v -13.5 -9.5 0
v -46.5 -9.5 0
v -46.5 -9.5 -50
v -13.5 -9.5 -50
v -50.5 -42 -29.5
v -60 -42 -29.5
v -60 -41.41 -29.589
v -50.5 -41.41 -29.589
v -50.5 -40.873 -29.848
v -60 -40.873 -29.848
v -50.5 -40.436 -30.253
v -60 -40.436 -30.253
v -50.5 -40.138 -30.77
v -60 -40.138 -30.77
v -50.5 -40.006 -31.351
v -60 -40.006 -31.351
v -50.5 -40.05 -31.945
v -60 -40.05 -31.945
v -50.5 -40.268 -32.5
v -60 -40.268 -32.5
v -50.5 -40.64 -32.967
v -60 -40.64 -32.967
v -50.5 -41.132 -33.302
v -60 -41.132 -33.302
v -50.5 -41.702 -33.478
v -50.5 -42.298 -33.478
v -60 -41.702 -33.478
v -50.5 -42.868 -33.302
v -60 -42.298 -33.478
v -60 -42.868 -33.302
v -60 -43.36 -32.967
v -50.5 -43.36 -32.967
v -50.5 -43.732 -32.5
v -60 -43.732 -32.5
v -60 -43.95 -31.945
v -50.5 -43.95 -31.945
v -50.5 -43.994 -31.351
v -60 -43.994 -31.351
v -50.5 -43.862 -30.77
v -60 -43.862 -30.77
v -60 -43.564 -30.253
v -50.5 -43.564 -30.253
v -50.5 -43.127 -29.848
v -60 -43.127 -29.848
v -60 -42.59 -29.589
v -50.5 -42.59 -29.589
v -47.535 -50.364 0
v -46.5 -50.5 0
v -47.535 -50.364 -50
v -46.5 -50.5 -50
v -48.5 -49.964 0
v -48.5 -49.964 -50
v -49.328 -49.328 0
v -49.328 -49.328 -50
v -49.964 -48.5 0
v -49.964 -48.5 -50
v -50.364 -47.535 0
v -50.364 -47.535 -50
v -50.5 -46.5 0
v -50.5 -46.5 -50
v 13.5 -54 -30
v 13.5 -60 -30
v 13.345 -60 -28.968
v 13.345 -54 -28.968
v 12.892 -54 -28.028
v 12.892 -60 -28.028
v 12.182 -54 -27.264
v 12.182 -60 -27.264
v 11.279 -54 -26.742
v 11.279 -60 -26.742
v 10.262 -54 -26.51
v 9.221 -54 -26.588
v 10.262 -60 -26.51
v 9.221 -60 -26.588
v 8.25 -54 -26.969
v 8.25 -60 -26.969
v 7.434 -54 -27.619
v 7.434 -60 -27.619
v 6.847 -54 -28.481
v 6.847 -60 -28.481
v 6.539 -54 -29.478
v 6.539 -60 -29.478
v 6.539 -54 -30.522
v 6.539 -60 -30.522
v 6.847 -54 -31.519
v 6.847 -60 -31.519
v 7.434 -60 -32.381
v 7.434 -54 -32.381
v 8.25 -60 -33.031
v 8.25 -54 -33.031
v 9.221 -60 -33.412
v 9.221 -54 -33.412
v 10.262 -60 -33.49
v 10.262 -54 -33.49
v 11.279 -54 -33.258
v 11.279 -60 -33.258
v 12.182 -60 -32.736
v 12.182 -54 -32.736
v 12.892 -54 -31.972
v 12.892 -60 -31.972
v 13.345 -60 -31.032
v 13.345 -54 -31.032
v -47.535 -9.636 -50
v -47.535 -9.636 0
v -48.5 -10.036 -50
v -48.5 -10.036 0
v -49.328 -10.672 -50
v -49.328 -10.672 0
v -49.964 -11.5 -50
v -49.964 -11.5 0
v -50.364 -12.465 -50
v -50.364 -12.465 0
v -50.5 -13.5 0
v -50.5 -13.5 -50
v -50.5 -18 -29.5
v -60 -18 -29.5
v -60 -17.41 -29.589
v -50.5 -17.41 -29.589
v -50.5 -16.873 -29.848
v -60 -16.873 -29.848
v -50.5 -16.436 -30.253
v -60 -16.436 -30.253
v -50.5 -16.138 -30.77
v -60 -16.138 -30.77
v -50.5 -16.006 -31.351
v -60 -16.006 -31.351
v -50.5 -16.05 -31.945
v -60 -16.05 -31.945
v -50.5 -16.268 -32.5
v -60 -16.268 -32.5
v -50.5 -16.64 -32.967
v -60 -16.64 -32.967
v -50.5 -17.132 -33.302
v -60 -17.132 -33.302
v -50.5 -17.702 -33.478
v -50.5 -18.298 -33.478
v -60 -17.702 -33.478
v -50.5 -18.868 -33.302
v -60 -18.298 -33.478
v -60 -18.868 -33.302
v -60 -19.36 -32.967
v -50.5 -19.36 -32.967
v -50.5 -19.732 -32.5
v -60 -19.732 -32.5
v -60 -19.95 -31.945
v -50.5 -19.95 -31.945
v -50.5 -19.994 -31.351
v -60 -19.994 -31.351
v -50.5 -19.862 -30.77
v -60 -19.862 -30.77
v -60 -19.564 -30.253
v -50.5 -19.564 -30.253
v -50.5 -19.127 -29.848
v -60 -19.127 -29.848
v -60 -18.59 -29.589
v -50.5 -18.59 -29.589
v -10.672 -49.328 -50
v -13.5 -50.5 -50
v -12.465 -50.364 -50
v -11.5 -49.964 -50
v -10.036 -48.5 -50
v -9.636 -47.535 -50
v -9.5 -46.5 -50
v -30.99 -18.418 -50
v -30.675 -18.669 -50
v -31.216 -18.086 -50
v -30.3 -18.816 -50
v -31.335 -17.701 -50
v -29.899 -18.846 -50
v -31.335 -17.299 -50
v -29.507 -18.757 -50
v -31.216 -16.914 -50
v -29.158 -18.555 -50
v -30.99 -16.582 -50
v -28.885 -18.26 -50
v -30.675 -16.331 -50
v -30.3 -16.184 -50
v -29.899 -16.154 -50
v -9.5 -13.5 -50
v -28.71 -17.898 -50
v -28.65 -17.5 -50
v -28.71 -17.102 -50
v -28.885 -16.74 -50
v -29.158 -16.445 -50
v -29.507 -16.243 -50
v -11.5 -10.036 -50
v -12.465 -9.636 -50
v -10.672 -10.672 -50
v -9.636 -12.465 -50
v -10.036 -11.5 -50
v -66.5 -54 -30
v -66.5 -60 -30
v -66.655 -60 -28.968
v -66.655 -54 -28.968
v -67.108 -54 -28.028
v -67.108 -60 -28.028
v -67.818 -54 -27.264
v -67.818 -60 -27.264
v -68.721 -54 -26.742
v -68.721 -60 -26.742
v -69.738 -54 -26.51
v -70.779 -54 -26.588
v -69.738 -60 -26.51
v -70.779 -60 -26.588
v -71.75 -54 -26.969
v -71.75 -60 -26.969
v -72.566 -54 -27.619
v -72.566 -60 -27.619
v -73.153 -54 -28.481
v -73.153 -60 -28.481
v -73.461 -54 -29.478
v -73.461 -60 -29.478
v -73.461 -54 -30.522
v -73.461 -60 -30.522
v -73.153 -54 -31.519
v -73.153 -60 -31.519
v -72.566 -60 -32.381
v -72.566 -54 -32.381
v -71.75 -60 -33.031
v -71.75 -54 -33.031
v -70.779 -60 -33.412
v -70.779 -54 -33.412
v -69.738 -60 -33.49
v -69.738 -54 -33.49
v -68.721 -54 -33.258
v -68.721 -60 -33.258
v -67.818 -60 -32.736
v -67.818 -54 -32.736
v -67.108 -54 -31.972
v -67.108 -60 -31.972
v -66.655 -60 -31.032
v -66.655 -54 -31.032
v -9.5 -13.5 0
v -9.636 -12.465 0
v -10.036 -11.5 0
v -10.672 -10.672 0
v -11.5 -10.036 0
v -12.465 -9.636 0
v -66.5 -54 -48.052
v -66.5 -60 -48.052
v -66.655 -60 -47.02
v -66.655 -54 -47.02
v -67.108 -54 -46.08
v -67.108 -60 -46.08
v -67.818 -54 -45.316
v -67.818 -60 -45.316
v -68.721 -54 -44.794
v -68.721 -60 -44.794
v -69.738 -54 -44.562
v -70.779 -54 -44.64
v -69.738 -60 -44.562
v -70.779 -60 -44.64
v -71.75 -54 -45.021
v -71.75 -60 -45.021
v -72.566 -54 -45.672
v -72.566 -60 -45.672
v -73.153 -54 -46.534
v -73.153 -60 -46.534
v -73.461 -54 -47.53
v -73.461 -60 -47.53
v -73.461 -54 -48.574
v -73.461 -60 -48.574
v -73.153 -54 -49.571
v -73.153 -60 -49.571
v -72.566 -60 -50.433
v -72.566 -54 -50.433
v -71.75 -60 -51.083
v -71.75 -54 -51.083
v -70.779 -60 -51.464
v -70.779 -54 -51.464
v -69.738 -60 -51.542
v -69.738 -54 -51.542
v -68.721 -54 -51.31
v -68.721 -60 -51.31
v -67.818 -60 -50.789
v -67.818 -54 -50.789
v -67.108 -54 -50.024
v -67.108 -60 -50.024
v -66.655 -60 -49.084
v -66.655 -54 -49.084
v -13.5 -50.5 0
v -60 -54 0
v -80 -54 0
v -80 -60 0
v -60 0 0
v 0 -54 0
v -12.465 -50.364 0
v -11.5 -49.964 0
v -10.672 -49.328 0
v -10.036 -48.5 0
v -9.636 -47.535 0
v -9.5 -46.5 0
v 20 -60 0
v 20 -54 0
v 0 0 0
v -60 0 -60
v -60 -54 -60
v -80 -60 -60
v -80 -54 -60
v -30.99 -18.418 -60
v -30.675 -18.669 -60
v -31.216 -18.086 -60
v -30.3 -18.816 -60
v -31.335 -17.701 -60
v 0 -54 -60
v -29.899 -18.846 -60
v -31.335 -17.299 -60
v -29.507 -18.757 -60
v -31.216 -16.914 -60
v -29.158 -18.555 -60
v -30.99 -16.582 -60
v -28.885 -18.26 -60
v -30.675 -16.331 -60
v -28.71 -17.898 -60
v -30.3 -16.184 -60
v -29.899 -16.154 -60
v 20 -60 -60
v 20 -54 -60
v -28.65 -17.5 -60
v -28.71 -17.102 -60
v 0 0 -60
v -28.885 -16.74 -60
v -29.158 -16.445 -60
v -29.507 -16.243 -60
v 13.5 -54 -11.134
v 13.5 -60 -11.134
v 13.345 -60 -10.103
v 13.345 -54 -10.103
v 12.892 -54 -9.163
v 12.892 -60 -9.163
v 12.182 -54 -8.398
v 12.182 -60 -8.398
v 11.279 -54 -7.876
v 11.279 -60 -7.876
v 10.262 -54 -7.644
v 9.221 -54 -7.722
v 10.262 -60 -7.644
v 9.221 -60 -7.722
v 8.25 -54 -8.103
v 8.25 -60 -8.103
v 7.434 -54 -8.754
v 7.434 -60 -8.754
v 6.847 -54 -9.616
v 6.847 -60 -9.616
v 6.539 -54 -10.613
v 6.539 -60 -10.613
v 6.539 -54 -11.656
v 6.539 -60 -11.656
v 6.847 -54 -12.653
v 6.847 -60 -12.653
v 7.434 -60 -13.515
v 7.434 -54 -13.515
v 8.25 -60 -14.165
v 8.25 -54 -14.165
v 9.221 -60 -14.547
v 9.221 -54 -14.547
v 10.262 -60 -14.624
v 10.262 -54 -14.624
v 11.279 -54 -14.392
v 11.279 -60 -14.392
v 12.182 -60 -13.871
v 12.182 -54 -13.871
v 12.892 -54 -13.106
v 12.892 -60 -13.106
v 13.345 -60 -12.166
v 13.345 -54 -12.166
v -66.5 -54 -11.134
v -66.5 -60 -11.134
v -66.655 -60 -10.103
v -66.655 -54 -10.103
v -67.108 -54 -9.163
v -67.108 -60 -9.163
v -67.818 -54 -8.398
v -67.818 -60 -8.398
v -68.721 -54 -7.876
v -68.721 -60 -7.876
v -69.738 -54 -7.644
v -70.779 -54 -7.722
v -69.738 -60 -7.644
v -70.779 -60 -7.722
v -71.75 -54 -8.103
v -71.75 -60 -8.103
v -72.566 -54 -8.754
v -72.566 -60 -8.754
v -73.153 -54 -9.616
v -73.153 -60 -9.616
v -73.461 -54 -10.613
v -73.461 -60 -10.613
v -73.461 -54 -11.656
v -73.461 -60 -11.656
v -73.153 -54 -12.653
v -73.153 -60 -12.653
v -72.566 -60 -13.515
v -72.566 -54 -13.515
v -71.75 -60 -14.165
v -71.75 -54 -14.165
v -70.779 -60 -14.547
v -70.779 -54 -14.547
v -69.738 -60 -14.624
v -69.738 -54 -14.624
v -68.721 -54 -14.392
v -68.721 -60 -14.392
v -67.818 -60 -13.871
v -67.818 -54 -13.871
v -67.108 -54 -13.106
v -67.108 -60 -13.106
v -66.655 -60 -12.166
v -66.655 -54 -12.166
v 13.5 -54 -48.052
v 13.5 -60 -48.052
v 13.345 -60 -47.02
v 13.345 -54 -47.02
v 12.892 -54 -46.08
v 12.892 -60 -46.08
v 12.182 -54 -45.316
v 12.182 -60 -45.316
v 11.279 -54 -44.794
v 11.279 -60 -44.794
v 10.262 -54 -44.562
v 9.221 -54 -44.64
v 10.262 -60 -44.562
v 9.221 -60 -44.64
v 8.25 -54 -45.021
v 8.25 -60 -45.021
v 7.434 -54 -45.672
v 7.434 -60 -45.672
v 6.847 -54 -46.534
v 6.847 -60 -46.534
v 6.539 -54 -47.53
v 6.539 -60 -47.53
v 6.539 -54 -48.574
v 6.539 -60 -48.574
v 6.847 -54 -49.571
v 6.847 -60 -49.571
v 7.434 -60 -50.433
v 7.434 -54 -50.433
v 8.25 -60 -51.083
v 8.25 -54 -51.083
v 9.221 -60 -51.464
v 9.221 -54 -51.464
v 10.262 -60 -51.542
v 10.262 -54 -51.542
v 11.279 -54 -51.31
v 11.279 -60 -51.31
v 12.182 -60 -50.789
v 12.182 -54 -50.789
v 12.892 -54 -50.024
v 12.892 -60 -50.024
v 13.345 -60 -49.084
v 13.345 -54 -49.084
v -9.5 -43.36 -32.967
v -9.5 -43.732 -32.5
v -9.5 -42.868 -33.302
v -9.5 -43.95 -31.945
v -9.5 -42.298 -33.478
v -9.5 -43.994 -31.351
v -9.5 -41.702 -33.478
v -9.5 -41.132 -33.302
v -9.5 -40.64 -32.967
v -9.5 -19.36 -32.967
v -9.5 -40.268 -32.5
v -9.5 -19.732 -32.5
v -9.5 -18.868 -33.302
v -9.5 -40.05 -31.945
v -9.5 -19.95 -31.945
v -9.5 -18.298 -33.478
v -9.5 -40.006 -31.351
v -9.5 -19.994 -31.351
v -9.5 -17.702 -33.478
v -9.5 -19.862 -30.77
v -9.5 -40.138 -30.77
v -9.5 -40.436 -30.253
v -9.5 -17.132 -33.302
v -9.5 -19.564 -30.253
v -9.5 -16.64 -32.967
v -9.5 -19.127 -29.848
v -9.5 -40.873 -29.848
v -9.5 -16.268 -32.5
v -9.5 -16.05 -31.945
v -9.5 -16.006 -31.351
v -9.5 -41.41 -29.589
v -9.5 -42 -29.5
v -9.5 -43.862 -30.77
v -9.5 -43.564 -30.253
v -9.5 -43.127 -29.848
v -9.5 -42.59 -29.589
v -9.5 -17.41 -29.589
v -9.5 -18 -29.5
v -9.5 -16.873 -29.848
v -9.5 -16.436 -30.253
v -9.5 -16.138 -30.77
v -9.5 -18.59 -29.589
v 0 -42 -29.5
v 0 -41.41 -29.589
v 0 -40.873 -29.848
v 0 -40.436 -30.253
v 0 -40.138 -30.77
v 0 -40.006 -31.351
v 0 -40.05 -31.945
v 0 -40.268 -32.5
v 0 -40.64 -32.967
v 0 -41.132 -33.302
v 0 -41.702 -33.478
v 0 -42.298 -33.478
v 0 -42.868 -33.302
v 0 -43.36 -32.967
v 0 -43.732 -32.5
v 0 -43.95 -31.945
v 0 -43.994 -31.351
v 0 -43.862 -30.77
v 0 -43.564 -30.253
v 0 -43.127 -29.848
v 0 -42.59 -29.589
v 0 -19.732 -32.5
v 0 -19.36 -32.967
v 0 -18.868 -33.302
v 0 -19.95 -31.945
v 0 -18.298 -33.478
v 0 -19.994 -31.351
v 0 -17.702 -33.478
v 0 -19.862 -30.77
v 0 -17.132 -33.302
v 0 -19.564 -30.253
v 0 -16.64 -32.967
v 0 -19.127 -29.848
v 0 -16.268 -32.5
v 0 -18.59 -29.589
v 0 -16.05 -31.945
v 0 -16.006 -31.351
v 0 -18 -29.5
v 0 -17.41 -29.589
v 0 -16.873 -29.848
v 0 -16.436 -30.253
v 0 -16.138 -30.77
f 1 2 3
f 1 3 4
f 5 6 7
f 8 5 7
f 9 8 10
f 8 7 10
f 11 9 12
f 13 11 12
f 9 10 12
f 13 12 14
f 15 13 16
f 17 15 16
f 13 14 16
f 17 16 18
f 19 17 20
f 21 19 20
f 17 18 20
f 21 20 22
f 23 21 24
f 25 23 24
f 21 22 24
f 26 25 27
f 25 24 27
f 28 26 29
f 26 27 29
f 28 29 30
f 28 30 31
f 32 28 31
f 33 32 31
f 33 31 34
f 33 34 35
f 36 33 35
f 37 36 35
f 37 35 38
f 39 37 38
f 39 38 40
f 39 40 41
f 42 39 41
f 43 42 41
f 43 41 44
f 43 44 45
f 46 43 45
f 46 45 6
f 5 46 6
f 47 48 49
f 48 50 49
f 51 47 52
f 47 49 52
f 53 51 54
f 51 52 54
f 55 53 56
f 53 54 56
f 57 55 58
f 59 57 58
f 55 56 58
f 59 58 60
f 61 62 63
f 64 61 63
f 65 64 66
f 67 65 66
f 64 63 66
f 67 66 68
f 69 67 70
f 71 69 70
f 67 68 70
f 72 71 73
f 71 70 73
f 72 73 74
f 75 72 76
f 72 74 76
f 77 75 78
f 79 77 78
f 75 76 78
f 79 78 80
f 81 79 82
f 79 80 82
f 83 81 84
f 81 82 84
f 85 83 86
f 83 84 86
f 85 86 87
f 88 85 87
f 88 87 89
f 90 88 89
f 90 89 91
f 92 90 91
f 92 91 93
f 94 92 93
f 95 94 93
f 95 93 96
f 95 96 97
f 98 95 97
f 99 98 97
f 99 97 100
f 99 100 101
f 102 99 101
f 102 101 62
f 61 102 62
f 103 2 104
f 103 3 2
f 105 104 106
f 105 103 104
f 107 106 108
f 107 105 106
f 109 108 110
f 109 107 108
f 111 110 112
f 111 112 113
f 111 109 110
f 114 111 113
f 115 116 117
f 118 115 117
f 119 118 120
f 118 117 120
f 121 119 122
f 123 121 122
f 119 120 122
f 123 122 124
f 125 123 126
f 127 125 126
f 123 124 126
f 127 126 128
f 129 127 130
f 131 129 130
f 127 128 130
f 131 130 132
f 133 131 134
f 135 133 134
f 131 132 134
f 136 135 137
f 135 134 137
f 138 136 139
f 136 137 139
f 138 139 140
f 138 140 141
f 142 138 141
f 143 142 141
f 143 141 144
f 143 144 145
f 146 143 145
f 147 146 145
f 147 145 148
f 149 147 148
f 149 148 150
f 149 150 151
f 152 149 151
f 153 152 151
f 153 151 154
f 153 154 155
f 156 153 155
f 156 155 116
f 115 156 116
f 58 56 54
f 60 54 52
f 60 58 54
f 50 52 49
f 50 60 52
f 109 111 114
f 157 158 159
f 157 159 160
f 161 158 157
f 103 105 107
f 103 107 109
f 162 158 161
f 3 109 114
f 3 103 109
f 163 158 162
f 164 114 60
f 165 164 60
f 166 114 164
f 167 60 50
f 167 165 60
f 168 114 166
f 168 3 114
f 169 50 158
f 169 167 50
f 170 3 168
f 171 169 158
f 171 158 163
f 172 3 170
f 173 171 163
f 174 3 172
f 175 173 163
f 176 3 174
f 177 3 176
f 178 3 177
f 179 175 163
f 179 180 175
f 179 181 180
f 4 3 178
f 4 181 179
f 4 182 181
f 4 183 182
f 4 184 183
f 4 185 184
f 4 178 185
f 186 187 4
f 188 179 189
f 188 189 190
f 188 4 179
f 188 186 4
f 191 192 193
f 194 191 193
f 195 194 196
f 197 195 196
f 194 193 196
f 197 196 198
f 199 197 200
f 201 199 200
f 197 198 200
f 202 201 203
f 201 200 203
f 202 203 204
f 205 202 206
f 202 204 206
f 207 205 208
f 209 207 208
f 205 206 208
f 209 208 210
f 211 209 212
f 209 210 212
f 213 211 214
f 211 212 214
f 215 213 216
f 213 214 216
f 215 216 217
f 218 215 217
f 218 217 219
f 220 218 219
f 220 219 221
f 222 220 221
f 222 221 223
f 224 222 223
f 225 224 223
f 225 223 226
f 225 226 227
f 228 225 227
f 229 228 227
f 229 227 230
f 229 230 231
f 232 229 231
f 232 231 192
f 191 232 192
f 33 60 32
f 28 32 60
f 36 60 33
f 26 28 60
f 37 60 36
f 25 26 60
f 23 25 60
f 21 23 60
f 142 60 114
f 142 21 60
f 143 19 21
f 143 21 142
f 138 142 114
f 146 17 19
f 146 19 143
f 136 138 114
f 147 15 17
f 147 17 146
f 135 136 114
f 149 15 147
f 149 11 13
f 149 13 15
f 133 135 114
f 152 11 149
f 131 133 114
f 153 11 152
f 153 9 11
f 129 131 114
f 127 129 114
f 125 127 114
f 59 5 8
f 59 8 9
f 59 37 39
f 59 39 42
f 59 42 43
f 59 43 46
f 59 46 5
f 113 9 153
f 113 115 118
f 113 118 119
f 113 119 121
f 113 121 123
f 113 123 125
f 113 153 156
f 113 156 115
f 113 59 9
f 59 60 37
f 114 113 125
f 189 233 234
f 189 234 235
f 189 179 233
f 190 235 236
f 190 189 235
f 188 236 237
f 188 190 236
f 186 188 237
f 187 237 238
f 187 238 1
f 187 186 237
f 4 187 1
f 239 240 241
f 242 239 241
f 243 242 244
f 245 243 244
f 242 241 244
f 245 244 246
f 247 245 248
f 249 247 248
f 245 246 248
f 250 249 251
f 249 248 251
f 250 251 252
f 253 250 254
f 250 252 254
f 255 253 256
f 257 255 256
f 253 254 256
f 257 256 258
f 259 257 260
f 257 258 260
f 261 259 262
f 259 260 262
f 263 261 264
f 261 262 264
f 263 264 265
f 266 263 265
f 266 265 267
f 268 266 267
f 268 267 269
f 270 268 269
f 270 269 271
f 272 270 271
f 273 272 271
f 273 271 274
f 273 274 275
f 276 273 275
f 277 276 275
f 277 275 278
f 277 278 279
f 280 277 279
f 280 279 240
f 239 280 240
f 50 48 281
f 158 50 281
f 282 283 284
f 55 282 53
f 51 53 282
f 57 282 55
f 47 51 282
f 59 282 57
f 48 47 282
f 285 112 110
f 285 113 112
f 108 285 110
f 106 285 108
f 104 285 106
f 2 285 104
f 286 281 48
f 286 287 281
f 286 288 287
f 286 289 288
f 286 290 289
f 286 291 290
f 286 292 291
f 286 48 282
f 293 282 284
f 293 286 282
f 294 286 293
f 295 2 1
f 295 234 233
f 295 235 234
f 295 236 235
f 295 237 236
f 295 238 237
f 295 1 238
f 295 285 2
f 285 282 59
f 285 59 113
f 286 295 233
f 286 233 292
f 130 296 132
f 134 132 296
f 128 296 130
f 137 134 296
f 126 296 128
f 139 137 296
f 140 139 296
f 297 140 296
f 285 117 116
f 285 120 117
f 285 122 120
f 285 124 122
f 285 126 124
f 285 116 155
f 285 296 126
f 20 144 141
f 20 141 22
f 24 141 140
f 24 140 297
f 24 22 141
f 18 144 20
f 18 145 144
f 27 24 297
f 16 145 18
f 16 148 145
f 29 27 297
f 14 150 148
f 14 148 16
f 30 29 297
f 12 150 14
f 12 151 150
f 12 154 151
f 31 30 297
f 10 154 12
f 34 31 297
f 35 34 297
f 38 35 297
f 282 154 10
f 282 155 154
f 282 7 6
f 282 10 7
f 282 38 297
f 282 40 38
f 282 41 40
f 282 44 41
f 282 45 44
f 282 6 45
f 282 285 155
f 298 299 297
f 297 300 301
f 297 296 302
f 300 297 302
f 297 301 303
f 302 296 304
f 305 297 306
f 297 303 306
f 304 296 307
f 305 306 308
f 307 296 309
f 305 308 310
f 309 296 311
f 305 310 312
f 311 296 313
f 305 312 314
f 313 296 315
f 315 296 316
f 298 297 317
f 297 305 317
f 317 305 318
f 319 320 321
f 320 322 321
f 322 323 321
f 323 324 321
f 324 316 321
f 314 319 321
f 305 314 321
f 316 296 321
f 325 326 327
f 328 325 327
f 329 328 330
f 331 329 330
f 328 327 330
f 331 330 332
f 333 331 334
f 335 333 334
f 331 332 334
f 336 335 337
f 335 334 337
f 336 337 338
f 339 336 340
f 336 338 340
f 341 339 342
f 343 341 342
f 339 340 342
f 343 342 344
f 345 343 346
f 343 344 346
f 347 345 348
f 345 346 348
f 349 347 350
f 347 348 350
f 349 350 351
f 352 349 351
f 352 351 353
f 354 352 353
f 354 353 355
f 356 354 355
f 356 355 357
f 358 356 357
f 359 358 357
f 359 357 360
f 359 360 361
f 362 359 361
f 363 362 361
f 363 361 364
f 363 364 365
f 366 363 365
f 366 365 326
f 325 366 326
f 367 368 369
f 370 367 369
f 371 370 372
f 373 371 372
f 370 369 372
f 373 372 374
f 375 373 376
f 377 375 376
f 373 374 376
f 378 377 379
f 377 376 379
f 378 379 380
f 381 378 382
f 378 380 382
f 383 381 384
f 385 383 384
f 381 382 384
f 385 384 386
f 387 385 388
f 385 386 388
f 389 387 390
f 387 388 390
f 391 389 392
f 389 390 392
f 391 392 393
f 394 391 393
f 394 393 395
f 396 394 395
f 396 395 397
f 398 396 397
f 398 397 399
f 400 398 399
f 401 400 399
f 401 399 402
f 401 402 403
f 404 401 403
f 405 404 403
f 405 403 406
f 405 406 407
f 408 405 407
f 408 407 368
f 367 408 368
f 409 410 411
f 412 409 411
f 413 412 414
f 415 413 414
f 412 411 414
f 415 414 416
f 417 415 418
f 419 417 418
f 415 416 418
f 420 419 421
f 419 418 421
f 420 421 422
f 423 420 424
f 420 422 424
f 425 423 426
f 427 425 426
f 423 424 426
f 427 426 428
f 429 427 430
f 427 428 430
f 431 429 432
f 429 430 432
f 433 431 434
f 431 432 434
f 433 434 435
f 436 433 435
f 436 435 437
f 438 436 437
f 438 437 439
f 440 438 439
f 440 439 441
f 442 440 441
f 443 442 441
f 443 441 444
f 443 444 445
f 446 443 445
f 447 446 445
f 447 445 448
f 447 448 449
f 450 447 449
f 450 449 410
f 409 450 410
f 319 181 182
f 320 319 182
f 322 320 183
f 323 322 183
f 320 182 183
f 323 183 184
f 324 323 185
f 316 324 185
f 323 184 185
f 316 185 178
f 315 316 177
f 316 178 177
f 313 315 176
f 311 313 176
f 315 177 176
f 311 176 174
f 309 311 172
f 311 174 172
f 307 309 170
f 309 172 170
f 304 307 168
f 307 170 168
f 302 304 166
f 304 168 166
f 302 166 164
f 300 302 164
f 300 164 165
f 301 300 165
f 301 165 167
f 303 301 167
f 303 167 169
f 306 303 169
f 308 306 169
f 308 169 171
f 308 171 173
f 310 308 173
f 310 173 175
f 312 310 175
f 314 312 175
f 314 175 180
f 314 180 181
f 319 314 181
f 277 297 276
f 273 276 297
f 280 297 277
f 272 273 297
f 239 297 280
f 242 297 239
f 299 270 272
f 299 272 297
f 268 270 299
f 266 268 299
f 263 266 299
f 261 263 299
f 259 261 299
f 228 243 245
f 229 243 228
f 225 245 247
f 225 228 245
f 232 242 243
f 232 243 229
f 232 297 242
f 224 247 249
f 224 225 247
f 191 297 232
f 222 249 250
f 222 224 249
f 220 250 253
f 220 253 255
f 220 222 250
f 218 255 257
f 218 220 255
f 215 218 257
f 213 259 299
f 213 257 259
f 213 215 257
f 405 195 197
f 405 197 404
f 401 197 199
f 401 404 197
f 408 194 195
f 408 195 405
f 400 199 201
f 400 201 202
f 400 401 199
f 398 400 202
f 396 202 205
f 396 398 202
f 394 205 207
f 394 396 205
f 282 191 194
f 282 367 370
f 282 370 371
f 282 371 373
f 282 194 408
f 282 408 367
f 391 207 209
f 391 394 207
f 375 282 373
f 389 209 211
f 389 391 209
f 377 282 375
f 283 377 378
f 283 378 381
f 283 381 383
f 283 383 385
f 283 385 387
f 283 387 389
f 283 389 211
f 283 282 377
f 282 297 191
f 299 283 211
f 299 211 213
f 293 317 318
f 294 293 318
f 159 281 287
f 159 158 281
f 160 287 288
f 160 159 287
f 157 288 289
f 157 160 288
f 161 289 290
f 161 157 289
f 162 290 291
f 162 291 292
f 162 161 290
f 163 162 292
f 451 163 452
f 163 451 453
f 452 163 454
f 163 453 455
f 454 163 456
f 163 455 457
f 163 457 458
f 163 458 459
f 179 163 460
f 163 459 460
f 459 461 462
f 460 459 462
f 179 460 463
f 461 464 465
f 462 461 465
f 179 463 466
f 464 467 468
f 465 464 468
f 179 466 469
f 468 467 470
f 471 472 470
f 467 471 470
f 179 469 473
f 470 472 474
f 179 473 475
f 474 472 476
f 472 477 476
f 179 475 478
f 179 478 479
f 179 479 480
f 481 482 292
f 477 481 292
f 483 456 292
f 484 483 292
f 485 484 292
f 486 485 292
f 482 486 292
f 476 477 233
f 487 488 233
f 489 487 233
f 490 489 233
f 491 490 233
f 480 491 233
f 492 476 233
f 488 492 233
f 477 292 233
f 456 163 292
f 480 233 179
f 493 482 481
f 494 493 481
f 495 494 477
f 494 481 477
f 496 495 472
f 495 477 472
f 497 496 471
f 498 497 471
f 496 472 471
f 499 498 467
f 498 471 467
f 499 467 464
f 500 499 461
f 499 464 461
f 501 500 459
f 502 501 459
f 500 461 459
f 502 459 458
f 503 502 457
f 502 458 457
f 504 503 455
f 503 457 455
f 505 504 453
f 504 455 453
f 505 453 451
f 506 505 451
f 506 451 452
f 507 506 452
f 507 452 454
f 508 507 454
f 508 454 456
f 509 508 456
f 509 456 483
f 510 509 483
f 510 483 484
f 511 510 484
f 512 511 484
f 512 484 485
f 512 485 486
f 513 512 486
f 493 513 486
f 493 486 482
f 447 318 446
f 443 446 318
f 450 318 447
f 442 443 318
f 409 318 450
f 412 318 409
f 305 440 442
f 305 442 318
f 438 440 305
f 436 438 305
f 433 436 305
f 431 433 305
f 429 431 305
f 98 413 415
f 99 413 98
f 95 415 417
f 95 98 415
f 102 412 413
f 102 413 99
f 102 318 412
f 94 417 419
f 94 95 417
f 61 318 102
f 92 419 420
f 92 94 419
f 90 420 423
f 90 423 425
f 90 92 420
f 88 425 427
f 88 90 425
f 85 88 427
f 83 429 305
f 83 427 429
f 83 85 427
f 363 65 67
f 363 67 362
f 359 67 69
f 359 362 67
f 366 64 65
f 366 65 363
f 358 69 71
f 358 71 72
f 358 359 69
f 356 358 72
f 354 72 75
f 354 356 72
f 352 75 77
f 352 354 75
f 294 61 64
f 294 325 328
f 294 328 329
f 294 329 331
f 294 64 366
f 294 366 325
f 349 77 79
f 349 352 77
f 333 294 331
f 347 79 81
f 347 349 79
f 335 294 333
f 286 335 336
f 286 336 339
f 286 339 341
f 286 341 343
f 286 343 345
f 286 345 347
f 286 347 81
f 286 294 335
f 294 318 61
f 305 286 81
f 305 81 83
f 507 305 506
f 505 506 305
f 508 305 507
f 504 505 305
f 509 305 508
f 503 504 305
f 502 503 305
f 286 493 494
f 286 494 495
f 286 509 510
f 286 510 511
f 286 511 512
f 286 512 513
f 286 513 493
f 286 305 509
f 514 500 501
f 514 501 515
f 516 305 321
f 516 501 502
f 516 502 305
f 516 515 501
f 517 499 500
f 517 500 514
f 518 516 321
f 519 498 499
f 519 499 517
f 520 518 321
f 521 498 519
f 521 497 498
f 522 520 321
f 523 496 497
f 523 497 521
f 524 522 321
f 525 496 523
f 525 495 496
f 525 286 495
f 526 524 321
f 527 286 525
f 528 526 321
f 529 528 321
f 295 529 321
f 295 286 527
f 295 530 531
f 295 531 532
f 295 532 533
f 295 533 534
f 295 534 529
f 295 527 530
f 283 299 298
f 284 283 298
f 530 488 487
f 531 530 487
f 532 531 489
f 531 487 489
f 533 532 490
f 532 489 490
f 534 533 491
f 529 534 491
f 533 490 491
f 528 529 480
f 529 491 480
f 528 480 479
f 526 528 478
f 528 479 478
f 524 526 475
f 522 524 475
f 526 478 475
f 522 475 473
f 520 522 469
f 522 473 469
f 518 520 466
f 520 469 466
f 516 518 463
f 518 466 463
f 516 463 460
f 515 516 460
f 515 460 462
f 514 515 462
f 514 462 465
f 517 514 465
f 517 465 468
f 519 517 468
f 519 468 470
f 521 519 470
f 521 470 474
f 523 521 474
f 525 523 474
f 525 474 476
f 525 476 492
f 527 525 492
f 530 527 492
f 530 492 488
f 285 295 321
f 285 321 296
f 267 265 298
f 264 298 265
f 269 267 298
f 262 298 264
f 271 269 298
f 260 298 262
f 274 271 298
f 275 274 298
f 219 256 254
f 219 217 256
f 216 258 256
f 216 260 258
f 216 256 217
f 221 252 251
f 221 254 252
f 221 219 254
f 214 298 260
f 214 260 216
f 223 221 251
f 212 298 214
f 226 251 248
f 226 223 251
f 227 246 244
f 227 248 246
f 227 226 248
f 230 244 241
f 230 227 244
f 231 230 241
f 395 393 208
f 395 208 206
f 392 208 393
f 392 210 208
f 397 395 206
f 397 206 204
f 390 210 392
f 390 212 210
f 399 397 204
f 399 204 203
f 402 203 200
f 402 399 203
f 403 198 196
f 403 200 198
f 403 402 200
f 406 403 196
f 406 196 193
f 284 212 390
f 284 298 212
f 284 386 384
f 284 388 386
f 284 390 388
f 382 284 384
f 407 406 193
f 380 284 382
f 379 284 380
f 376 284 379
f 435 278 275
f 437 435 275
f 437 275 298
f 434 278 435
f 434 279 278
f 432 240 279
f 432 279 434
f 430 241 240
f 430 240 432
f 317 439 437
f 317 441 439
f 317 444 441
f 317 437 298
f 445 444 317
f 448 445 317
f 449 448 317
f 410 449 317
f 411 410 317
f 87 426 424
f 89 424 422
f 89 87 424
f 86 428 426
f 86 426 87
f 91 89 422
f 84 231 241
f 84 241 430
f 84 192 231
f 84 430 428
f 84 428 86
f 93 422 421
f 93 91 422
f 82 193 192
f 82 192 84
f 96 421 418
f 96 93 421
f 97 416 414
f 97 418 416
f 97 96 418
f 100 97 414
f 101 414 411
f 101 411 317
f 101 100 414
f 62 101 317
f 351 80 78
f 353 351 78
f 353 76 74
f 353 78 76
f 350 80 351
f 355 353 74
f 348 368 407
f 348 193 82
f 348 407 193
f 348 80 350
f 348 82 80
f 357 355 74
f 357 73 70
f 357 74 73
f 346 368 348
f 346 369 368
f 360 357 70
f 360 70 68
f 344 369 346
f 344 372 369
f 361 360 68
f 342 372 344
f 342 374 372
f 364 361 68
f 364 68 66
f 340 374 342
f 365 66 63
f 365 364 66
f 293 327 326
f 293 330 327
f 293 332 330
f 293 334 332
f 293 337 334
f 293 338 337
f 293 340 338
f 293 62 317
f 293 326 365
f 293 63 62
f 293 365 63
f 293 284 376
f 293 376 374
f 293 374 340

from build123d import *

# Parameters (mm, degrees)
BOSS_EXTRU_1_DEPTH      = 60
ESQUISSE2_W             = 41
ESQUISSE2_H             = 41
ENL_V_MAT_EXTRU_1_DEPTH = 50
CONG_1_R                = 4
ESQUISSE4_R             = 3.5
ENL_V_MAT_EXTRU_2_DEPTH = 61
ESQUISSE6_R             = 2
ENL_V_MAT_EXTRU_4_DEPTH = 81
ESQUISSE7_R             = 1.35
ENL_V_MAT_EXTRU_5_DEPTH = 11


with BuildPart() as part:
    # Esquisse1 → Boss.-Extru.1 (new body)
    with BuildSketch(Plane.XY):
        Polygon((0, 0), (-60, 0), (-60, -54), (-80, -54), (-80, -60), (20, -60), (20, -54), (0, -54), align=None)
    extrude(amount=-BOSS_EXTRU_1_DEPTH)

    # Esquisse2 → Enlèv. mat.-Extru.1 (cut)
    with BuildSketch(Plane.XY):
        with Locations((-30, -30)):
            Rectangle(ESQUISSE2_W, ESQUISSE2_H)
    extrude(amount=-ENL_V_MAT_EXTRU_1_DEPTH, mode=Mode.SUBTRACT)

    # Congé1
    cong_1_edges = [part.edges().sort_by_distance(p)[0] for p in [
        (-50.5, -50.5, -25),
        (-50.5, -9.5, -25),
        (-9.5, -9.5, -25),
        (-9.5, -50.5, -25),
    ]]
    fillet(cong_1_edges, radius=CONG_1_R)

    # Esquisse4 → Enlèv. mat.-Extru.2 (cut, through all)
    with BuildSketch(Plane.XZ.offset(60)):
        with Locations((-70, -11.134276922)):
            Circle(ESQUISSE4_R)
        with Locations((-70, -30)):
            Circle(ESQUISSE4_R)
        with Locations((-70, -48.052106988)):
            Circle(ESQUISSE4_R)
        with Locations((10, -48.052106988)):
            Circle(ESQUISSE4_R)
        with Locations((10, -30)):
            Circle(ESQUISSE4_R)
        with Locations((10, -11.134276922)):
            Circle(ESQUISSE4_R)
    extrude(amount=-ENL_V_MAT_EXTRU_2_DEPTH, mode=Mode.SUBTRACT)

    # Esquisse6 → Enlèv. mat.-Extru.4 (cut, through all)
    with BuildSketch(Plane.ZY.offset(60)):
        with Locations((-31.500403789, -18)):
            Circle(ESQUISSE6_R)
        with Locations((-31.500403789, -42)):
            Circle(ESQUISSE6_R)
    extrude(amount=-ENL_V_MAT_EXTRU_4_DEPTH, mode=Mode.SUBTRACT)

    # Esquisse7 → Enlèv. mat.-Extru.5 (cut, through all)
    with BuildSketch(Plane.XY.offset(-50)):
        with Locations((-30, -17.5)):
            Circle(ESQUISSE7_R)
    extrude(amount=-ENL_V_MAT_EXTRU_5_DEPTH, mode=Mode.SUBTRACT)


solid = part.part
